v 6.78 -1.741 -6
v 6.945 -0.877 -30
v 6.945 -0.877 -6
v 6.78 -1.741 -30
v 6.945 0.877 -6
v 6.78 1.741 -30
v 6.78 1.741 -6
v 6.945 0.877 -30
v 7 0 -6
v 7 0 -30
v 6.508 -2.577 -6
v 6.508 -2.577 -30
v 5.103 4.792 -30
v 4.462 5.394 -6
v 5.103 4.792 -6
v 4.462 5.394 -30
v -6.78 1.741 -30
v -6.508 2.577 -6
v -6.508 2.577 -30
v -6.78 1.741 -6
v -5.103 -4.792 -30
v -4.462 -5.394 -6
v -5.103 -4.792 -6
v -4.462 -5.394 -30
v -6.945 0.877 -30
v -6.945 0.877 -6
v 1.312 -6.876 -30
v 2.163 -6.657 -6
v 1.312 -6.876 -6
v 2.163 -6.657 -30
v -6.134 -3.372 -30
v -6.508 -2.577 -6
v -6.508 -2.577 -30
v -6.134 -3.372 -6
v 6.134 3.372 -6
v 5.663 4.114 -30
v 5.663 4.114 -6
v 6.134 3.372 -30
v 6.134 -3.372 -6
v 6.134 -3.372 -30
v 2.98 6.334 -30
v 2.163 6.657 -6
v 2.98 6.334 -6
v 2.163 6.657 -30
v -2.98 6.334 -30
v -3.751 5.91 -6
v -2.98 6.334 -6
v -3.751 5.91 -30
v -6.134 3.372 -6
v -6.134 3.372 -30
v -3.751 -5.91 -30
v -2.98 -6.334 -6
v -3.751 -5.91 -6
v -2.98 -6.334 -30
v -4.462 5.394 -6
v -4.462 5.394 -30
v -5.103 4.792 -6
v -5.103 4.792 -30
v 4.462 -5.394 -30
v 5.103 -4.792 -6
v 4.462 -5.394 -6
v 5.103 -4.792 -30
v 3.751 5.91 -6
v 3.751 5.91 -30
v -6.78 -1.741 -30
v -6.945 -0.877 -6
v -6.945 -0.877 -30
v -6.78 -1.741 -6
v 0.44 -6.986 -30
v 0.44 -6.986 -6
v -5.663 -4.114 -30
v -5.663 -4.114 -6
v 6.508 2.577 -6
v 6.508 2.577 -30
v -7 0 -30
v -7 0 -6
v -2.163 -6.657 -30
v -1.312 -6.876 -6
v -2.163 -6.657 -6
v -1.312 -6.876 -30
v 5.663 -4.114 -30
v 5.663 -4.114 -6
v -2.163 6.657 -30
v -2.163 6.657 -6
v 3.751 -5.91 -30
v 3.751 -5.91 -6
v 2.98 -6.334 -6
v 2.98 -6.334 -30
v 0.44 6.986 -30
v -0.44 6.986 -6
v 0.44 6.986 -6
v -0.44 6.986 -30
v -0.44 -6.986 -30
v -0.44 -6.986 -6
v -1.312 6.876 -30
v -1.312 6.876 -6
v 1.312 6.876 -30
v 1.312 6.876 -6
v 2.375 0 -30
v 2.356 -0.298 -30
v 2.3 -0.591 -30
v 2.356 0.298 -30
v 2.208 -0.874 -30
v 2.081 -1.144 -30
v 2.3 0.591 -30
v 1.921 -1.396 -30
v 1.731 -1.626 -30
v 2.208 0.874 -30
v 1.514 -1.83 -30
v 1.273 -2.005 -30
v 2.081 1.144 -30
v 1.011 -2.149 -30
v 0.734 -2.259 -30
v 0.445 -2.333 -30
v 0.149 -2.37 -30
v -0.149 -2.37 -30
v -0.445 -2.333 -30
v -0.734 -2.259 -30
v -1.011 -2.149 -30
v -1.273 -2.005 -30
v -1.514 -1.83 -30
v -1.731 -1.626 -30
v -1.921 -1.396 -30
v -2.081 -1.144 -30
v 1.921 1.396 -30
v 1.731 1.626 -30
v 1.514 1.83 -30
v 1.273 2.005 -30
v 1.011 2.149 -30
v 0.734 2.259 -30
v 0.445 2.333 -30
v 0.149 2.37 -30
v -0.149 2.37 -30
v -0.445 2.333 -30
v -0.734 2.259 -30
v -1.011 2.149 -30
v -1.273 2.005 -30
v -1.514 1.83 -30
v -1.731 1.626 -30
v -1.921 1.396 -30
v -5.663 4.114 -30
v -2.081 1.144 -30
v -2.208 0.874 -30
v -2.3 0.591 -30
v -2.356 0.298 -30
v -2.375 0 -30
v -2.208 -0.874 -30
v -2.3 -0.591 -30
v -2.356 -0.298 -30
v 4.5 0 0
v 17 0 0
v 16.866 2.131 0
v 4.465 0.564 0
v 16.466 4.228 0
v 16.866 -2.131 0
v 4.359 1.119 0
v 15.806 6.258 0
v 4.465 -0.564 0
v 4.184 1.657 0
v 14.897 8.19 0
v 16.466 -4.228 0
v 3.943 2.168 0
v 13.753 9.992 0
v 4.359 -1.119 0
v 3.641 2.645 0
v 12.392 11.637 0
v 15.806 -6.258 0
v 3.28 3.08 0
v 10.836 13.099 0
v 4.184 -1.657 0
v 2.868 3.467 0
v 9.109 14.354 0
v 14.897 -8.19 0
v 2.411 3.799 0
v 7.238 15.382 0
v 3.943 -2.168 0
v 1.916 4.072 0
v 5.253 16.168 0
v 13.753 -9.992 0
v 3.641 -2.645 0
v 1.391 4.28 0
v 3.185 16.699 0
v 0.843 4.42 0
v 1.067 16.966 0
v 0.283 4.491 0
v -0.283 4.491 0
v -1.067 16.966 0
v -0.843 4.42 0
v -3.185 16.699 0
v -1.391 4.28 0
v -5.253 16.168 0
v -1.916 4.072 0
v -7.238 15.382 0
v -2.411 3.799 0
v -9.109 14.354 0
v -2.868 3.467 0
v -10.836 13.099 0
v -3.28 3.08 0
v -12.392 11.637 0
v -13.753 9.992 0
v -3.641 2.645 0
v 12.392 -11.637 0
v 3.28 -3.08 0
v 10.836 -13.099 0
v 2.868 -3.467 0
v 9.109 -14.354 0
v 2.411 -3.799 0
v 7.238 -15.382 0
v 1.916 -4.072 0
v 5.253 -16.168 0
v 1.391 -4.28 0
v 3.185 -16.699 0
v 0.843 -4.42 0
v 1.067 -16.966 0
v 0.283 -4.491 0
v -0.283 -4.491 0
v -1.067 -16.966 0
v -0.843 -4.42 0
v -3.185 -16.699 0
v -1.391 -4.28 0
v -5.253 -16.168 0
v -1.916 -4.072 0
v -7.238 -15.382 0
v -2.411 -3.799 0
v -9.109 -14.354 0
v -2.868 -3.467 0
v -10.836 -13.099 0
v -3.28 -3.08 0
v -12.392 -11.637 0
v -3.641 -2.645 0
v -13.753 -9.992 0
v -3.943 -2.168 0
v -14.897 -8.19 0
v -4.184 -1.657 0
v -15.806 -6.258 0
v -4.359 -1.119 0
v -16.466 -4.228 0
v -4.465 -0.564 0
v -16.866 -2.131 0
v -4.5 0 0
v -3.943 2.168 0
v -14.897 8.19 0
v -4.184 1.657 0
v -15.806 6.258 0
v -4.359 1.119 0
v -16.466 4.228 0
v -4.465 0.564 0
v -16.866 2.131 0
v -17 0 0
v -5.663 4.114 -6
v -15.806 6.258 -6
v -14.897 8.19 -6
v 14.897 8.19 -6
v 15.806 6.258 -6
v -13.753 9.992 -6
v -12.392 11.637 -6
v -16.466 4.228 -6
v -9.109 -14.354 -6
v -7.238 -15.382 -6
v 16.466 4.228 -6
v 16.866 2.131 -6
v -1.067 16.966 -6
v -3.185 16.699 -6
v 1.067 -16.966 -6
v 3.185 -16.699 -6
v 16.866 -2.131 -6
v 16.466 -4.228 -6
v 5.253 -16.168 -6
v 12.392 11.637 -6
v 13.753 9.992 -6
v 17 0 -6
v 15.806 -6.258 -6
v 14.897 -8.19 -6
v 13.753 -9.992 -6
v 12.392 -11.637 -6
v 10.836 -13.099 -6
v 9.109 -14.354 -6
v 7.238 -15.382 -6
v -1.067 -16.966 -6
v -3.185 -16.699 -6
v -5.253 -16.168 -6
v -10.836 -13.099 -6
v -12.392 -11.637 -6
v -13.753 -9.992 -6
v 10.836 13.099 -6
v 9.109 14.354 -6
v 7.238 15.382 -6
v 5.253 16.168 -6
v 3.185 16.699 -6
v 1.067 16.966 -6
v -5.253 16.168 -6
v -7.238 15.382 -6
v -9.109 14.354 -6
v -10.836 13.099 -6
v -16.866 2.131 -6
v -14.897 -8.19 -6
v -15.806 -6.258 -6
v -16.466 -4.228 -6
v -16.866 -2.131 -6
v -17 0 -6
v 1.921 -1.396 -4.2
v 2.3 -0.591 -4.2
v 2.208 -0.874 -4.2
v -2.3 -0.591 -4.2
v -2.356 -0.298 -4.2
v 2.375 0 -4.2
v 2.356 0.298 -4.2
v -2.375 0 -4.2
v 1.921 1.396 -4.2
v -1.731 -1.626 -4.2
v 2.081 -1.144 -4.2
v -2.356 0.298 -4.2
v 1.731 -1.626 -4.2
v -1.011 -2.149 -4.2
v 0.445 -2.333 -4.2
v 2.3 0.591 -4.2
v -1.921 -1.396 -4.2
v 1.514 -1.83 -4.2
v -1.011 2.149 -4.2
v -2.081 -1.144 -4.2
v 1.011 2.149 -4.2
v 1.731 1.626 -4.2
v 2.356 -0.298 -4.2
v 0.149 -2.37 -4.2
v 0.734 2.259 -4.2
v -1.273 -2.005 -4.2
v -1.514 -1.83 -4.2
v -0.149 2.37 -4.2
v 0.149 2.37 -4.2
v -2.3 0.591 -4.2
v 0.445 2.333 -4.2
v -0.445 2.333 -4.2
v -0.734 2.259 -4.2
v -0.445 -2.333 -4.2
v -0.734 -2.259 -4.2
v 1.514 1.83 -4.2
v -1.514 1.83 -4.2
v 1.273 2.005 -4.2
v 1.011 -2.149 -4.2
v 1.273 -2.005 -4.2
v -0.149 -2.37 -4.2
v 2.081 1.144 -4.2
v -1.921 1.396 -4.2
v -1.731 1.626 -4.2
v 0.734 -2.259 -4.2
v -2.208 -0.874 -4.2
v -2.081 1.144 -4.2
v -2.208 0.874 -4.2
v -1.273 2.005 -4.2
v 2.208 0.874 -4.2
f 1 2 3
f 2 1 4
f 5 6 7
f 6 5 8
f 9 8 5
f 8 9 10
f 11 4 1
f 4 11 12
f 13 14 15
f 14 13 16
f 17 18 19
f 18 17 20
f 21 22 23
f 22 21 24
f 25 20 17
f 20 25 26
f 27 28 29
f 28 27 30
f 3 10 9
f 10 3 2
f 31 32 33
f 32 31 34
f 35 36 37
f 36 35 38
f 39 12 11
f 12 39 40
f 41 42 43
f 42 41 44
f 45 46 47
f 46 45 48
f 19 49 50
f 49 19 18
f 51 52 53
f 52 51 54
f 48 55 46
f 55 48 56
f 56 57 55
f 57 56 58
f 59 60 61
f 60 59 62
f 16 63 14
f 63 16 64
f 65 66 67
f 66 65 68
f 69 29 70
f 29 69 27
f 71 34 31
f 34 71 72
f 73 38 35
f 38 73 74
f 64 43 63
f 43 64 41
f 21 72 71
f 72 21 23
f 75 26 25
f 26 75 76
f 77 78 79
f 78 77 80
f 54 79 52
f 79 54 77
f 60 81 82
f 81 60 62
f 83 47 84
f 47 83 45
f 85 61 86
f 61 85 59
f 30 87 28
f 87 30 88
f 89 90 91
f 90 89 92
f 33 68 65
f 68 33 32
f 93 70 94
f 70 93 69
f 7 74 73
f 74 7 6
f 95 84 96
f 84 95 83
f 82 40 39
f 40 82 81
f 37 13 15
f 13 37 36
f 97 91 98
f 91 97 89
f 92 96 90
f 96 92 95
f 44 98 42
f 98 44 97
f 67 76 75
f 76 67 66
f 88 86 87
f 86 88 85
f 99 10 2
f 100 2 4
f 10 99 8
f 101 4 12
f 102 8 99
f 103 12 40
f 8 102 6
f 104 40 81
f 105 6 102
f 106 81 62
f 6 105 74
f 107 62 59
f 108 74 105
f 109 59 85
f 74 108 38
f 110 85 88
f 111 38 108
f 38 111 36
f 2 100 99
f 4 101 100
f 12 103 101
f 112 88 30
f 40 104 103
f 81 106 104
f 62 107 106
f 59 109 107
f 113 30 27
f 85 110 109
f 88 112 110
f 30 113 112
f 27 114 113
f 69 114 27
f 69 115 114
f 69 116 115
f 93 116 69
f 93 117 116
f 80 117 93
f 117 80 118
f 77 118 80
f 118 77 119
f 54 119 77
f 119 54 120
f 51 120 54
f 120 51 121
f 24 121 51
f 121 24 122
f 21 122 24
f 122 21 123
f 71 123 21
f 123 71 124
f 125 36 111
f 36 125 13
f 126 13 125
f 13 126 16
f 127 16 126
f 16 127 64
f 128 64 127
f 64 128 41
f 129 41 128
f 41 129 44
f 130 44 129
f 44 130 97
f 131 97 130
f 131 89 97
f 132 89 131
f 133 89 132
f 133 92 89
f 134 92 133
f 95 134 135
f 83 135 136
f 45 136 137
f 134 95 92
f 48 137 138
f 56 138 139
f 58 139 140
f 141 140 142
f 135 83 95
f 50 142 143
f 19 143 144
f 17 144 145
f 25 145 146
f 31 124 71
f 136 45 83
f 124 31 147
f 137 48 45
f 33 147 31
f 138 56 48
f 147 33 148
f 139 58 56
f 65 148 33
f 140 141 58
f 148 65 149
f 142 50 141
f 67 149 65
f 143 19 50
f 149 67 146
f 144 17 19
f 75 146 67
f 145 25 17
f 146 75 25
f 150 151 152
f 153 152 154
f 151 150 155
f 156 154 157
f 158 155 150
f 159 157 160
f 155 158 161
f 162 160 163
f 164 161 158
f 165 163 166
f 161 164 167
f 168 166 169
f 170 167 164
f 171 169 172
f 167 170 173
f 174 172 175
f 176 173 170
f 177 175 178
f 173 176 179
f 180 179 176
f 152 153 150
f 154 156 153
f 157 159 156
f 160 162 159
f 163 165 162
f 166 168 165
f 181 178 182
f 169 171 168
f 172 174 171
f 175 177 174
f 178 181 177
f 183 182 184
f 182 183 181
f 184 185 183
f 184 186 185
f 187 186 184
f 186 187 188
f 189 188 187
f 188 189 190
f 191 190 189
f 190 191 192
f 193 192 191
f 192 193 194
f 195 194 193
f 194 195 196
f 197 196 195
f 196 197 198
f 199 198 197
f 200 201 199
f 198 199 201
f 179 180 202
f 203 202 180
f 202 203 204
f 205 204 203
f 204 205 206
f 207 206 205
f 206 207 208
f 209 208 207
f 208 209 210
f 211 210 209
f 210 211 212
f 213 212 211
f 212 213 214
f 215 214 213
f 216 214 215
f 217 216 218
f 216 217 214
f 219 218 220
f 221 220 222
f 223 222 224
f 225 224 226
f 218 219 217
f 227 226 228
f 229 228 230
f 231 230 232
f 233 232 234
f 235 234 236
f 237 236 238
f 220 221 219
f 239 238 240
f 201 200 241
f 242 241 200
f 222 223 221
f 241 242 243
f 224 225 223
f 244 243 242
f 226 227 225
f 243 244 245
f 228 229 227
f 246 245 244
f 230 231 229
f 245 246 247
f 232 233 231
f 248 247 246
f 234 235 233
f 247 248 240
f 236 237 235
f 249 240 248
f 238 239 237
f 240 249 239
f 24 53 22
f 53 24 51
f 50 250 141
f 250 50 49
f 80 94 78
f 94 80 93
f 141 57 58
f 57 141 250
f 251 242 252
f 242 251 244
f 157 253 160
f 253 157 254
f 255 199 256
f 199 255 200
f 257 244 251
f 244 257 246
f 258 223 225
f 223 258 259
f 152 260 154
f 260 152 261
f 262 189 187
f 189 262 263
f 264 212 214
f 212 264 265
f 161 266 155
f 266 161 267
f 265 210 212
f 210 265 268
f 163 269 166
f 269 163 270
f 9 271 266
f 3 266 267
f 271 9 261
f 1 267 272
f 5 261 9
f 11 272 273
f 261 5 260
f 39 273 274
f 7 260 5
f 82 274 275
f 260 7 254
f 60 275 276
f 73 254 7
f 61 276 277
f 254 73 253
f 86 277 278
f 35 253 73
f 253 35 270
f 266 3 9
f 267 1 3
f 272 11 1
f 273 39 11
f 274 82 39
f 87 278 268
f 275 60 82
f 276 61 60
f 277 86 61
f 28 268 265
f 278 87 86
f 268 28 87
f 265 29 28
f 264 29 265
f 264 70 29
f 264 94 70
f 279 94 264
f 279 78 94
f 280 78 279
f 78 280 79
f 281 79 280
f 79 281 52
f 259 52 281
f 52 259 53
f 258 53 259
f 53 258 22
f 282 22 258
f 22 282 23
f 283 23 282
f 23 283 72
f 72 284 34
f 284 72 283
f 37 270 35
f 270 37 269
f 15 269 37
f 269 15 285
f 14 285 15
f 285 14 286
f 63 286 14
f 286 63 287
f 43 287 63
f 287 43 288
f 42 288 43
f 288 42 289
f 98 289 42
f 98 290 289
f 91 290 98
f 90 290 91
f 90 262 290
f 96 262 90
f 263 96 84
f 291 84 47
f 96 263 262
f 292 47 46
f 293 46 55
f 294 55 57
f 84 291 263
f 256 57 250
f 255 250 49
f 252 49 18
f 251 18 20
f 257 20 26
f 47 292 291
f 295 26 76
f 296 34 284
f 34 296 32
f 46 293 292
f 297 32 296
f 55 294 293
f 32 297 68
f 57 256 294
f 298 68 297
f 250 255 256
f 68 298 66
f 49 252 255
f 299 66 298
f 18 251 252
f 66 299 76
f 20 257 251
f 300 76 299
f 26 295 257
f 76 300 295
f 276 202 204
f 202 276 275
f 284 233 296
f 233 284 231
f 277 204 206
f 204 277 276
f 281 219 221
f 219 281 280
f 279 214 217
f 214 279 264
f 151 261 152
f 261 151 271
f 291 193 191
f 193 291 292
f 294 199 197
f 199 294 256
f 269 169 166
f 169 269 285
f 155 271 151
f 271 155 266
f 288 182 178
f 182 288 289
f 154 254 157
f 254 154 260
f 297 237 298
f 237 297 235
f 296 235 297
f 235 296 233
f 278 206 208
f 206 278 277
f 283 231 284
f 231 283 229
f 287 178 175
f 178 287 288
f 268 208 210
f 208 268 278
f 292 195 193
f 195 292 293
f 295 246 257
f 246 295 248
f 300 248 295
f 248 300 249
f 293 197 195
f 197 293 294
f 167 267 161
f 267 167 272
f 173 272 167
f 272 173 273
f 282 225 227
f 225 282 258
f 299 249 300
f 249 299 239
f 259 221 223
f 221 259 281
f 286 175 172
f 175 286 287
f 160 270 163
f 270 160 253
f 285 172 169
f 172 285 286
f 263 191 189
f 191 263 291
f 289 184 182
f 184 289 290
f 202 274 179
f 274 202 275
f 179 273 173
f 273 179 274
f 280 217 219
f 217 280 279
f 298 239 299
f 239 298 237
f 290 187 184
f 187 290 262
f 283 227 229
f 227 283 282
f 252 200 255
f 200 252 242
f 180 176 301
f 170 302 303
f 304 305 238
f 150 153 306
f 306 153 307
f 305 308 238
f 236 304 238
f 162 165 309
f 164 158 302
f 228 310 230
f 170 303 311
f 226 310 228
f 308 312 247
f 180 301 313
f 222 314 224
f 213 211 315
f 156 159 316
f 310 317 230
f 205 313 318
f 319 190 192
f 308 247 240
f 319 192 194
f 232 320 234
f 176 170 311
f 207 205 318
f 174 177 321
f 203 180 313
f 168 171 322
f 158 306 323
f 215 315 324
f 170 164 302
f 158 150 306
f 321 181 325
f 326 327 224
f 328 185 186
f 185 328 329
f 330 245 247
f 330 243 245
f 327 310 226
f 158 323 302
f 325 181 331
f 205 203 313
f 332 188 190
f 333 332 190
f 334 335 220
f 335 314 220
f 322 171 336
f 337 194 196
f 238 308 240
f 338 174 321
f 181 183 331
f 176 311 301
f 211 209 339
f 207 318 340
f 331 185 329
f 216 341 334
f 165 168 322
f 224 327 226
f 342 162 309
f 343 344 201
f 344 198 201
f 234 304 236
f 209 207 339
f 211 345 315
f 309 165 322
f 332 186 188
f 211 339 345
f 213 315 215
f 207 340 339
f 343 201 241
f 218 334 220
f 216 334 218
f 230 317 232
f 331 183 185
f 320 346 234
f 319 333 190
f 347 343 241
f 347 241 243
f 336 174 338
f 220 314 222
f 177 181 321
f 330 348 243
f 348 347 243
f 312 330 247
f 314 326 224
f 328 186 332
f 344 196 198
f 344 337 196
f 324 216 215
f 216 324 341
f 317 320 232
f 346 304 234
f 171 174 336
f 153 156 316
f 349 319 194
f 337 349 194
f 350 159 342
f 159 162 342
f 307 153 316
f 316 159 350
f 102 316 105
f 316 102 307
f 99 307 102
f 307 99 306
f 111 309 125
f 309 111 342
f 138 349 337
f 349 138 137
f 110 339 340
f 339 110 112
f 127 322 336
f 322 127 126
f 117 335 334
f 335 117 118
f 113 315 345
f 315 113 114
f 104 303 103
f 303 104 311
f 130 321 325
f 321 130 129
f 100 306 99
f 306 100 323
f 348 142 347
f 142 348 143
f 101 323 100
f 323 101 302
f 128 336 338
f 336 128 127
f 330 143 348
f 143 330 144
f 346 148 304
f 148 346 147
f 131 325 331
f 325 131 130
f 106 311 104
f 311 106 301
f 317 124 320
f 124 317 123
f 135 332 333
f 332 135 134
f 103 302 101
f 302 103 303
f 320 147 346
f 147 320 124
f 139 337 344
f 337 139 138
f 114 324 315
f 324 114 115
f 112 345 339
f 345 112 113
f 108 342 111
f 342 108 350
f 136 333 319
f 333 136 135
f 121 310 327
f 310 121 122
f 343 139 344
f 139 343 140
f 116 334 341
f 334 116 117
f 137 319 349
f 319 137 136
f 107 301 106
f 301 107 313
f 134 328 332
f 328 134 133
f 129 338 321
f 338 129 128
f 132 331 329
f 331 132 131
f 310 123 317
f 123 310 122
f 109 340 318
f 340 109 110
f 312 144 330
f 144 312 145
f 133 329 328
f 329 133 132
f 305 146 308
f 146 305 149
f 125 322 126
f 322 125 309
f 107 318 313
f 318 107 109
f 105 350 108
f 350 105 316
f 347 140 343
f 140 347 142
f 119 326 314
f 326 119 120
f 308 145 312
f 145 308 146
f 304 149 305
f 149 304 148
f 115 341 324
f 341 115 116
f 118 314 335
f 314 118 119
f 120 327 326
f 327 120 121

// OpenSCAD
$fn = 50;


difference() {
	union() {
		translate(v = [0, 0, -30.0000000000]) {
			cylinder(h = 30, r = 7.0000000000);
		}
		translate(v = [0, 0, -6.0000000000]) {
			cylinder(h = 6, r = 17.0000000000);
		}
	}
	union() {
		translate(v = [0, 0, 0]) {
			rotate(a = [0, 0, 0]) {
				difference() {
					union() {
						#translate(v = [0, 0, -30.0000000000]) {
							cylinder(h = 30, r = 2.2500000000);
						}
						#translate(v = [0, 0, -4.2000000000]) {
							cylinder(h = 4.2000000000, r1 = 2.3750000000, r2 = 4.5000000000);
						}
						#translate(v = [0, 0, -30.0000000000]) {
							cylinder(h = 30, r = 2.3750000000);
						}
						#translate(v = [0, 0, -30.0000000000]) {
							cylinder(h = 30, r = 2.2500000000);
						}
					}
					union();
				}
			}
		}
	}
}
